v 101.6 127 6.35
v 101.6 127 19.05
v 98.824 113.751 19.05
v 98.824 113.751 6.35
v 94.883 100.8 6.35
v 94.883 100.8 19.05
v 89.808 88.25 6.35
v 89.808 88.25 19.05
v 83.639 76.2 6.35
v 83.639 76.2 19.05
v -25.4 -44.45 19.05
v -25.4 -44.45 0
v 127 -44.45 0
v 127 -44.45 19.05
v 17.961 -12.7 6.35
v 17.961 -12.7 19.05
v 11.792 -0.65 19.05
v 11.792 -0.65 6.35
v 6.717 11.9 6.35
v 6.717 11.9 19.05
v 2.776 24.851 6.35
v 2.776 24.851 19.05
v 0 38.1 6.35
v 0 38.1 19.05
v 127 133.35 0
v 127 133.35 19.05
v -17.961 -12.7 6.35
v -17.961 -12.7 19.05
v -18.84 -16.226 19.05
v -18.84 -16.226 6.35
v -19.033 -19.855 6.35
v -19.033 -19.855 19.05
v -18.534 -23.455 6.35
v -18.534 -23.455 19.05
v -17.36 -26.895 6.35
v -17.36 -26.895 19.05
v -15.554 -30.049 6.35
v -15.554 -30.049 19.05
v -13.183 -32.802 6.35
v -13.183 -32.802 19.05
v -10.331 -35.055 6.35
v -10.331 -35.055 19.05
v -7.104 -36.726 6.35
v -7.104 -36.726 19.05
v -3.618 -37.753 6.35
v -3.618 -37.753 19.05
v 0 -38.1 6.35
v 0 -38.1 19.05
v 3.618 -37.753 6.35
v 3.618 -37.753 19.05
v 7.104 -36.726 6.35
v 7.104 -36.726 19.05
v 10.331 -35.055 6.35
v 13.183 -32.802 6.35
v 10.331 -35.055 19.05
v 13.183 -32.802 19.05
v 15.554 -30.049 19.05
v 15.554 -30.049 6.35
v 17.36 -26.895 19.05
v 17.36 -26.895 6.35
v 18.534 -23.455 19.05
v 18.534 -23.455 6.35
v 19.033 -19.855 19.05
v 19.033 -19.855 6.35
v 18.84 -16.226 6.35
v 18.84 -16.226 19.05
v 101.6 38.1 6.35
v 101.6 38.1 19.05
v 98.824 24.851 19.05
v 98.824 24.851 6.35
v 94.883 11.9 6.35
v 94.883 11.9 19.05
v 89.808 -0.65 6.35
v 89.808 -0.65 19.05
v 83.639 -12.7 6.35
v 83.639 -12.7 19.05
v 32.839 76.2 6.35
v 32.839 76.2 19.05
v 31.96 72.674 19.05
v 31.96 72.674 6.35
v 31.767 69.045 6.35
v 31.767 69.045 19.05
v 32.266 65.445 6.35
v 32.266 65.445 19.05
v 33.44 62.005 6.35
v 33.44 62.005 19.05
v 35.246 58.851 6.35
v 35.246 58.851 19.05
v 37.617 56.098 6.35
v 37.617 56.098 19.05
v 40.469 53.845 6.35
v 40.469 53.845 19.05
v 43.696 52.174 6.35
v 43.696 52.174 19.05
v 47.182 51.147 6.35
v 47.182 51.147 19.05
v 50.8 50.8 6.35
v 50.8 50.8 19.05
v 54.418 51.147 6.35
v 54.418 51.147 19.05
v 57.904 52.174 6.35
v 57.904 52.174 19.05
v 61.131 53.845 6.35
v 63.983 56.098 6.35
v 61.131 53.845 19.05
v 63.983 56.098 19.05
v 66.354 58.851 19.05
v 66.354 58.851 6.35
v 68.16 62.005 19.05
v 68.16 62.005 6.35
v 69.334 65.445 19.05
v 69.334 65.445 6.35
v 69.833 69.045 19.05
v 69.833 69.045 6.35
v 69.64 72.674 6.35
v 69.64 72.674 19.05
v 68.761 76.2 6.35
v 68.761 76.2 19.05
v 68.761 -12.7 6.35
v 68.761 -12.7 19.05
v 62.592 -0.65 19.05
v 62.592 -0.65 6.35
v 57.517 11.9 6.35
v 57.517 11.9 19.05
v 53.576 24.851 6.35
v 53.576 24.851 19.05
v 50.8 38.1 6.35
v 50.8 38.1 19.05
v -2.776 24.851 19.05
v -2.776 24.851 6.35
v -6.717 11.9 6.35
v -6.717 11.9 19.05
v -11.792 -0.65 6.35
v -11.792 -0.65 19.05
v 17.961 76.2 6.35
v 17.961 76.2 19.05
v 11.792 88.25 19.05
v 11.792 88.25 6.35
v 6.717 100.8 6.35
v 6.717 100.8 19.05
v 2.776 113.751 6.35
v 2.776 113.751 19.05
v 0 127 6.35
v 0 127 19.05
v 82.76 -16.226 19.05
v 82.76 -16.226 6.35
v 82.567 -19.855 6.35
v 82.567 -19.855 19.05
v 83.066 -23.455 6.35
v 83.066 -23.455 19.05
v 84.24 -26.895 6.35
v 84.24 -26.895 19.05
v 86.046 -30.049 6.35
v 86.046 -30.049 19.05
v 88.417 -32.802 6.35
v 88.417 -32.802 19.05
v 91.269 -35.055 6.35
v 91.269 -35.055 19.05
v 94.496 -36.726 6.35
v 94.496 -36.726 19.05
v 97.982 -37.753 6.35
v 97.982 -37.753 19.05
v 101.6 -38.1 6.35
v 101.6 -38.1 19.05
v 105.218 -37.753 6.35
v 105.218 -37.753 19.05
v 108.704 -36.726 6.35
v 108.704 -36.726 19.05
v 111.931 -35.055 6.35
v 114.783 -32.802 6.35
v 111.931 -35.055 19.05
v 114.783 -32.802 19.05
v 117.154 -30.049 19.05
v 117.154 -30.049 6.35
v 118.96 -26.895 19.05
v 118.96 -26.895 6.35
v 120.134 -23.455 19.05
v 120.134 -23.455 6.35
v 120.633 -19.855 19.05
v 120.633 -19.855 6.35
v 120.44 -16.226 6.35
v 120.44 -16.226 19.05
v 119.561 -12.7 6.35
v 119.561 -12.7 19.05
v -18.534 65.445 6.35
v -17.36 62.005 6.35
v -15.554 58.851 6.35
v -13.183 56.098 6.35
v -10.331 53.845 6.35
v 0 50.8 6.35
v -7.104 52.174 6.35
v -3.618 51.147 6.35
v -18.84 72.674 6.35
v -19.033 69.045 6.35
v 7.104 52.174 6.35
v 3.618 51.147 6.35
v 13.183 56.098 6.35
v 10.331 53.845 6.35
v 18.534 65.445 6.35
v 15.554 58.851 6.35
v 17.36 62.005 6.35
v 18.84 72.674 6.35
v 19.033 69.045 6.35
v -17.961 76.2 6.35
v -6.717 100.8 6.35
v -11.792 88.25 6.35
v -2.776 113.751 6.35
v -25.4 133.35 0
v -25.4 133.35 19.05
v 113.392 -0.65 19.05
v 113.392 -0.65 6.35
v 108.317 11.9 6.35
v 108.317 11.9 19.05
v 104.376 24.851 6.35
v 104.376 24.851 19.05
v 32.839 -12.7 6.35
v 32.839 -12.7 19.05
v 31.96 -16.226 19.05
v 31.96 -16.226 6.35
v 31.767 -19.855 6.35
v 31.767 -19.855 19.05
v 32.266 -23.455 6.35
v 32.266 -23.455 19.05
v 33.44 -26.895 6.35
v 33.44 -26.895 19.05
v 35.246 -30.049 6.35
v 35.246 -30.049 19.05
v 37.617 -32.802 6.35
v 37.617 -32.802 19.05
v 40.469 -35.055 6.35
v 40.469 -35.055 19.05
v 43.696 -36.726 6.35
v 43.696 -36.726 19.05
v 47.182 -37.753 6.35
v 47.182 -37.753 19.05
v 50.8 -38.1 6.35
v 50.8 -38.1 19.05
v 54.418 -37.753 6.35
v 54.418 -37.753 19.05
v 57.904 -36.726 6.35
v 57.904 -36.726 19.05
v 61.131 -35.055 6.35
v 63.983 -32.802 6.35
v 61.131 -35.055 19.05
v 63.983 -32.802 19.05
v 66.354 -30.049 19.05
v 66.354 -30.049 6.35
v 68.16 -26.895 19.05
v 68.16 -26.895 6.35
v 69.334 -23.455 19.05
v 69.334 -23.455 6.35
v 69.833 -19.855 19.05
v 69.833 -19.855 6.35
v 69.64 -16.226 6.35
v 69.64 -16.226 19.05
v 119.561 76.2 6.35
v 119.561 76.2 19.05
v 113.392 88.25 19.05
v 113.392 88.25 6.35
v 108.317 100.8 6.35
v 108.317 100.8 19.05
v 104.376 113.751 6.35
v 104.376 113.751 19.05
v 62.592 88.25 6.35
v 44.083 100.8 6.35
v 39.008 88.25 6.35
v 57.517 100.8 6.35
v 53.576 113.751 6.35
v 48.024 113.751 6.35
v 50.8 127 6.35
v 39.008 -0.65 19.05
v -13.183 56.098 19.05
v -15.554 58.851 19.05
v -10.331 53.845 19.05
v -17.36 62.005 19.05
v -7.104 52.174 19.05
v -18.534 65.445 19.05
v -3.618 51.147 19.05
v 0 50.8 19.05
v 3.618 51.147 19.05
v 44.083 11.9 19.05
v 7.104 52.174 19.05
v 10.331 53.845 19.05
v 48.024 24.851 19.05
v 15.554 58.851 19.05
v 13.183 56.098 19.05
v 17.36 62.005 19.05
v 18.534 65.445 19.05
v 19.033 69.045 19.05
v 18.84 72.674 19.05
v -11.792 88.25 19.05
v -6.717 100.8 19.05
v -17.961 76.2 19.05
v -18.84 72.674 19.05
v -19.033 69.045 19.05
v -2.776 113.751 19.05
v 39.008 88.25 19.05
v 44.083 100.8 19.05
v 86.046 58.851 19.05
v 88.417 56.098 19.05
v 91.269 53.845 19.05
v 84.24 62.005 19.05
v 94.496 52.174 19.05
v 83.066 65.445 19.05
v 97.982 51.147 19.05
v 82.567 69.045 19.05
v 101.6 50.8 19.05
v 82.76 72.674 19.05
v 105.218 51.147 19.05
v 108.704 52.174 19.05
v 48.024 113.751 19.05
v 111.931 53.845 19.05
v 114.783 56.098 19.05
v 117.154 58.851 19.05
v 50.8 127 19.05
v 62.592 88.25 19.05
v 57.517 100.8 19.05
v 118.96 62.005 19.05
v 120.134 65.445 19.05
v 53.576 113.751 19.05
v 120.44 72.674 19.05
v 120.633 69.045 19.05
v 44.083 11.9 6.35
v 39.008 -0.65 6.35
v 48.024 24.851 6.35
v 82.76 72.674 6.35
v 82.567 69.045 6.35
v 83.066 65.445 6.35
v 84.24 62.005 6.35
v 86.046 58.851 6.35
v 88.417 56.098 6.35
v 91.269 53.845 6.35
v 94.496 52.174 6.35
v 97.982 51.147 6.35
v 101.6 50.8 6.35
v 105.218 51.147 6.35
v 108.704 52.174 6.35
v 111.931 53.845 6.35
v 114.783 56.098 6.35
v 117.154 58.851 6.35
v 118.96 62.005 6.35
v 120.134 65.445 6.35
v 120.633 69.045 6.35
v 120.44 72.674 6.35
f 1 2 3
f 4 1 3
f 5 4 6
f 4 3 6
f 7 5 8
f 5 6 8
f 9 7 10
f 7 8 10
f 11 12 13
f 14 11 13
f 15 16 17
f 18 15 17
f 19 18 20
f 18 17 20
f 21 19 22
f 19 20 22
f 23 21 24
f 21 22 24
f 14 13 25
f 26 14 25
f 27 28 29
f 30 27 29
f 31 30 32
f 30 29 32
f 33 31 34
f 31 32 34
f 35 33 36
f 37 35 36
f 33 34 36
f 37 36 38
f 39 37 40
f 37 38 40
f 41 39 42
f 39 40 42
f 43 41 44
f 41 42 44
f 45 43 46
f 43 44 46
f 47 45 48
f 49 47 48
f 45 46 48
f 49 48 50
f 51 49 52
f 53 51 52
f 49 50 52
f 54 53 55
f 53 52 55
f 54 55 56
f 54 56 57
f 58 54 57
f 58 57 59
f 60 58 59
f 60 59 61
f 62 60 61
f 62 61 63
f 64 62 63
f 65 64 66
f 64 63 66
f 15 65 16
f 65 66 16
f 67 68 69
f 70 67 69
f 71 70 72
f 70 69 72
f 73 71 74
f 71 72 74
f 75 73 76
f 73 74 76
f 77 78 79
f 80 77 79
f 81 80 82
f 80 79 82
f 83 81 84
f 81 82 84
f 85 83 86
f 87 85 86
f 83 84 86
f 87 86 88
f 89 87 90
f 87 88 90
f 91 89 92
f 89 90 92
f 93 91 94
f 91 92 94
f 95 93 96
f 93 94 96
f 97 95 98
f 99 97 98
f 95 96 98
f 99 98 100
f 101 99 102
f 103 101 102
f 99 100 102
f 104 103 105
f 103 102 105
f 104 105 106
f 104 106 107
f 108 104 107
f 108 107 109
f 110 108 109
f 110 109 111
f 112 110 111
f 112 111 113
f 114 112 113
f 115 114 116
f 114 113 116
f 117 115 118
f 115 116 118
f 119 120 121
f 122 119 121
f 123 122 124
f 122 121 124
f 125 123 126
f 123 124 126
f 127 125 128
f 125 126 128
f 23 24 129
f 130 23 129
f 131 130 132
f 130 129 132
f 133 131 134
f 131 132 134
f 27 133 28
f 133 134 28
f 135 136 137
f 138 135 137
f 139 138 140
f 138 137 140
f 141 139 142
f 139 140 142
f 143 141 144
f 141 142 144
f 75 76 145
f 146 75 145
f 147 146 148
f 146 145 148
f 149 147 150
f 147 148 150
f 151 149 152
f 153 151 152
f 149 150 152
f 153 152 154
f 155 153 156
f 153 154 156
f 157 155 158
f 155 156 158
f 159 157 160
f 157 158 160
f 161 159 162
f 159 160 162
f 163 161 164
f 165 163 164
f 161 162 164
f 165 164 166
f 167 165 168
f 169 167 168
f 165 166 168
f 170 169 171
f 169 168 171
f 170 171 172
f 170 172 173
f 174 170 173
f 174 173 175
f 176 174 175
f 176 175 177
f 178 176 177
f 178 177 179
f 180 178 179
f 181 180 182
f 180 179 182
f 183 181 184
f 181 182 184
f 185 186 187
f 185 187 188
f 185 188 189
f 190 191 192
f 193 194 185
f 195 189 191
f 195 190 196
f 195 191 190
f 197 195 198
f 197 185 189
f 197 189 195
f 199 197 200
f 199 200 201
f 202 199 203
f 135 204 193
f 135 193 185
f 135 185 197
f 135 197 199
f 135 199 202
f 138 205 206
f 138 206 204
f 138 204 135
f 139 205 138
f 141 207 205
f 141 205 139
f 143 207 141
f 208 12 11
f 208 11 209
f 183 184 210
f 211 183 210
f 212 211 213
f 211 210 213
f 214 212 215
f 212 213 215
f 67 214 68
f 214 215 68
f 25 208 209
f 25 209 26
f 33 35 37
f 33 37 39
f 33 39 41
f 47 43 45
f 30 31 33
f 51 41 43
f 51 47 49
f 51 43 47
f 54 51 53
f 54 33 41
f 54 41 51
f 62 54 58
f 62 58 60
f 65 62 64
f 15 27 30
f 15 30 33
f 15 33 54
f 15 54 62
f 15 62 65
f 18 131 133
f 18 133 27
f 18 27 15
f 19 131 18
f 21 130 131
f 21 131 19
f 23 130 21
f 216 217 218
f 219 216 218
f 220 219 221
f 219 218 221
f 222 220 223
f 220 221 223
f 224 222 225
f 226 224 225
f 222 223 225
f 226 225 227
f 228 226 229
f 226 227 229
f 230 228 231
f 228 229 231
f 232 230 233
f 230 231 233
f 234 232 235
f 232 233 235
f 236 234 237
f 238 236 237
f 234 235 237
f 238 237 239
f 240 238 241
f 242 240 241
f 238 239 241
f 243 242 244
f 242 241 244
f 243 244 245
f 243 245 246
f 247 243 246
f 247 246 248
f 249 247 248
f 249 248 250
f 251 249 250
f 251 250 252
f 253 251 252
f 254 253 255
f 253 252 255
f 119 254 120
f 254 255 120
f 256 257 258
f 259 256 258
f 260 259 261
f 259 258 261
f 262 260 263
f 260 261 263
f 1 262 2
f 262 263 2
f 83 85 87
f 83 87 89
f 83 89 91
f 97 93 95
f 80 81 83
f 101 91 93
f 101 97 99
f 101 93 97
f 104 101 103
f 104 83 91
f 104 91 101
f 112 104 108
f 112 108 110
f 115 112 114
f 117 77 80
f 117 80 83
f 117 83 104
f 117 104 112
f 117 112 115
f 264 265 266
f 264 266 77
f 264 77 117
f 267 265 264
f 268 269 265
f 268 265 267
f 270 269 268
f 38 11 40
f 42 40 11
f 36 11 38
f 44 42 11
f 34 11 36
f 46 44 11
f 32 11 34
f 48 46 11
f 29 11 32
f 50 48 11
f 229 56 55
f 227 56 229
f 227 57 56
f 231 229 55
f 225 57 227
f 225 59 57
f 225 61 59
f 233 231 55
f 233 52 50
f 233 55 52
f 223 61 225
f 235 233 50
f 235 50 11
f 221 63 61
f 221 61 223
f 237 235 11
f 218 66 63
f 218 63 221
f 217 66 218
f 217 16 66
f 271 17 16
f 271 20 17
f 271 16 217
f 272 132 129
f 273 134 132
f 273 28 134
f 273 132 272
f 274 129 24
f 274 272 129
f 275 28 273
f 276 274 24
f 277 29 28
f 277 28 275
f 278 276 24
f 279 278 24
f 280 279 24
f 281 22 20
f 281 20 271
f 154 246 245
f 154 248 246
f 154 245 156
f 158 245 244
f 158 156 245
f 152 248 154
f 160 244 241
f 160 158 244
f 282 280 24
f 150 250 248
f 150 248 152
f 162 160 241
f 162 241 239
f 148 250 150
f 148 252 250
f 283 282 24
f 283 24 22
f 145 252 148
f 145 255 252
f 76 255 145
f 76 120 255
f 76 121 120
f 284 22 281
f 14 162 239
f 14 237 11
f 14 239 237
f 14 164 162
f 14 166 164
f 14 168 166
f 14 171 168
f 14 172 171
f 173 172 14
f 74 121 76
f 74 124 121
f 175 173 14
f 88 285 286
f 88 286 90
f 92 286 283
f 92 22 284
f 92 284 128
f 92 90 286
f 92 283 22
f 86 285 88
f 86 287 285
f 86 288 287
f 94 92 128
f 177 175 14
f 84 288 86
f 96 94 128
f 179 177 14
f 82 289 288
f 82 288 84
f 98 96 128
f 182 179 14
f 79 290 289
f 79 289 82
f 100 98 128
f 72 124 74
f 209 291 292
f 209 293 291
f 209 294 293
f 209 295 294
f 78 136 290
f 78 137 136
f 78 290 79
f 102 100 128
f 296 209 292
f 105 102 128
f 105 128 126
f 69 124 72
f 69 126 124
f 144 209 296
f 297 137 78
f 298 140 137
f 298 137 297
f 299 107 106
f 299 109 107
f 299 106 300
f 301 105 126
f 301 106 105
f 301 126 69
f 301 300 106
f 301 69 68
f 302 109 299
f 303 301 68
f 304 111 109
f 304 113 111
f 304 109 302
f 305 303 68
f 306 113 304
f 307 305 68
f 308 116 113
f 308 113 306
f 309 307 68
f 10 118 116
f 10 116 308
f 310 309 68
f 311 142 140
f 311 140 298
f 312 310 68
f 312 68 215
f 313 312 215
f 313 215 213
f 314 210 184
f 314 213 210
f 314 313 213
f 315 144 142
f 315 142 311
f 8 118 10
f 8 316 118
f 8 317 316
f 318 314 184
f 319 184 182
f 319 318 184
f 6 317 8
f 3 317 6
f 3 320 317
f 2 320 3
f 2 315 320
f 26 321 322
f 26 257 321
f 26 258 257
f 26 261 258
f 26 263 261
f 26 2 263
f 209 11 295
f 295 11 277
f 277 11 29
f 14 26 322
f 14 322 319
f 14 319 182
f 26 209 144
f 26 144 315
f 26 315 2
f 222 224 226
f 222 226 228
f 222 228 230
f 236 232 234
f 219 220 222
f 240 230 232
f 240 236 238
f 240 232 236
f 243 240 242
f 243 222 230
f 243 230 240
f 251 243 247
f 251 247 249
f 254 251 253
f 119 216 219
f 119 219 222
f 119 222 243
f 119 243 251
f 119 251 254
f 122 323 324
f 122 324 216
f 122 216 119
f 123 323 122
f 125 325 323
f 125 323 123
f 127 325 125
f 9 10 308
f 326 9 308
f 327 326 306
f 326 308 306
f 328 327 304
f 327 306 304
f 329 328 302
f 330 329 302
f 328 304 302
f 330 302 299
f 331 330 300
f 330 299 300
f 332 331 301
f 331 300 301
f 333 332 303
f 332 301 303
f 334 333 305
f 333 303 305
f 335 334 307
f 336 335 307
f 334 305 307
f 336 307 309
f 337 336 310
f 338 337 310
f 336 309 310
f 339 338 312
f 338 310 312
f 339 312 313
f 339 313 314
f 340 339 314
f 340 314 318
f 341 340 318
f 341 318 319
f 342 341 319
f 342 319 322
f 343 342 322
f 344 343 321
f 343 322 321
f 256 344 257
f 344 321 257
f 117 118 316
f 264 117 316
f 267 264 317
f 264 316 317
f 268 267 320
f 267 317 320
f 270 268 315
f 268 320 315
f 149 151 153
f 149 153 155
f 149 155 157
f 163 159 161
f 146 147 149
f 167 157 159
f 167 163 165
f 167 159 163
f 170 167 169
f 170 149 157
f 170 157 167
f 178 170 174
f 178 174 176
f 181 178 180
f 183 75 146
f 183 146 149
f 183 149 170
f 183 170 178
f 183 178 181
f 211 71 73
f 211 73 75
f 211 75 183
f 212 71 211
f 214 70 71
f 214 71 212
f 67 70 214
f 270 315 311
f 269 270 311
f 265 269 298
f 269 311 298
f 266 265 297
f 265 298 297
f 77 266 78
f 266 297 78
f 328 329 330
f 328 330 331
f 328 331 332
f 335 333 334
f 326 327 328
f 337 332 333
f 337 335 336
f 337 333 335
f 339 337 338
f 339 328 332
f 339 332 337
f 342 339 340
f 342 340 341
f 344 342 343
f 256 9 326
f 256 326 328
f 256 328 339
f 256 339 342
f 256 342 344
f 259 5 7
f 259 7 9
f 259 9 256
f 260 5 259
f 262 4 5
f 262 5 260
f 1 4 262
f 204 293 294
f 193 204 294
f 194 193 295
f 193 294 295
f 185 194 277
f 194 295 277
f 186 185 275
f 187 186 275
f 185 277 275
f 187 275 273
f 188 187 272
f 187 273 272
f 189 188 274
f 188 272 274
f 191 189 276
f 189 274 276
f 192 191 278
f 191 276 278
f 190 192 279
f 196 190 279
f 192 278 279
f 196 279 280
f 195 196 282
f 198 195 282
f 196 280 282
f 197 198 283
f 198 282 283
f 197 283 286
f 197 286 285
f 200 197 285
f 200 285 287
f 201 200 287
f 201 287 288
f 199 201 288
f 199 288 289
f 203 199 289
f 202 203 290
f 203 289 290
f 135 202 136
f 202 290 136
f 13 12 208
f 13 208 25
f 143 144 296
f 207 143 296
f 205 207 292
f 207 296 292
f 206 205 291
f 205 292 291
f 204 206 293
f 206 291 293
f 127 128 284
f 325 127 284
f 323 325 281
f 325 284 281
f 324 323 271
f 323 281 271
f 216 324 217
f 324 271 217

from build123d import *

# Parameters (mm, degrees)
SKETCH1_W            = 50.8
SKETCH1_H            = 88.9
BOSS_EXTRUDE1_DEPTH  = 19.05
CUT_EXTRUDE1_DEPTH   = 12.7
LPATTERN1_COUNT      = 3
LPATTERN1_PITCH      = 50.8
LPATTERN1_COUNT_DIR2 = 2
LPATTERN1_PITCH_DIR2 = 88.9


with BuildPart() as part:
    # Sketch1 → Boss-Extrude1 (new body)
    with BuildSketch(Plane.XY):
        Rectangle(SKETCH1_W, SKETCH1_H)
    boss_extrude1 = extrude(amount=BOSS_EXTRUDE1_DEPTH)

    # Sketch2 → Cut-Extrude1 (cut)
    with BuildSketch(Plane.XY.offset(19.05)):
        with BuildLine():
            ThreePointArc((-17.960512242, -12.7), (0, -38.1), (17.960512242, -12.7))
            ThreePointArc((17.960512242, -12.7), (6.717373, 11.89995), (0, 38.1))
            ThreePointArc((0, 38.1), (-6.717373, 11.89995), (-17.960512242, -12.7))
        make_face()
    cut_extrude1 = extrude(amount=-CUT_EXTRUDE1_DEPTH, mode=Mode.SUBTRACT)

    # LPattern1: Boss-Extrude1, Cut-Extrude1 3 × 2
    with Locations(*[(i * LPATTERN1_PITCH, j * LPATTERN1_PITCH_DIR2, 0) for i in range(LPATTERN1_COUNT) for j in range(LPATTERN1_COUNT_DIR2) if (i, j) != (0, 0)]):
        add(boss_extrude1)
        add(cut_extrude1, mode=Mode.SUBTRACT)


solid = part.part
